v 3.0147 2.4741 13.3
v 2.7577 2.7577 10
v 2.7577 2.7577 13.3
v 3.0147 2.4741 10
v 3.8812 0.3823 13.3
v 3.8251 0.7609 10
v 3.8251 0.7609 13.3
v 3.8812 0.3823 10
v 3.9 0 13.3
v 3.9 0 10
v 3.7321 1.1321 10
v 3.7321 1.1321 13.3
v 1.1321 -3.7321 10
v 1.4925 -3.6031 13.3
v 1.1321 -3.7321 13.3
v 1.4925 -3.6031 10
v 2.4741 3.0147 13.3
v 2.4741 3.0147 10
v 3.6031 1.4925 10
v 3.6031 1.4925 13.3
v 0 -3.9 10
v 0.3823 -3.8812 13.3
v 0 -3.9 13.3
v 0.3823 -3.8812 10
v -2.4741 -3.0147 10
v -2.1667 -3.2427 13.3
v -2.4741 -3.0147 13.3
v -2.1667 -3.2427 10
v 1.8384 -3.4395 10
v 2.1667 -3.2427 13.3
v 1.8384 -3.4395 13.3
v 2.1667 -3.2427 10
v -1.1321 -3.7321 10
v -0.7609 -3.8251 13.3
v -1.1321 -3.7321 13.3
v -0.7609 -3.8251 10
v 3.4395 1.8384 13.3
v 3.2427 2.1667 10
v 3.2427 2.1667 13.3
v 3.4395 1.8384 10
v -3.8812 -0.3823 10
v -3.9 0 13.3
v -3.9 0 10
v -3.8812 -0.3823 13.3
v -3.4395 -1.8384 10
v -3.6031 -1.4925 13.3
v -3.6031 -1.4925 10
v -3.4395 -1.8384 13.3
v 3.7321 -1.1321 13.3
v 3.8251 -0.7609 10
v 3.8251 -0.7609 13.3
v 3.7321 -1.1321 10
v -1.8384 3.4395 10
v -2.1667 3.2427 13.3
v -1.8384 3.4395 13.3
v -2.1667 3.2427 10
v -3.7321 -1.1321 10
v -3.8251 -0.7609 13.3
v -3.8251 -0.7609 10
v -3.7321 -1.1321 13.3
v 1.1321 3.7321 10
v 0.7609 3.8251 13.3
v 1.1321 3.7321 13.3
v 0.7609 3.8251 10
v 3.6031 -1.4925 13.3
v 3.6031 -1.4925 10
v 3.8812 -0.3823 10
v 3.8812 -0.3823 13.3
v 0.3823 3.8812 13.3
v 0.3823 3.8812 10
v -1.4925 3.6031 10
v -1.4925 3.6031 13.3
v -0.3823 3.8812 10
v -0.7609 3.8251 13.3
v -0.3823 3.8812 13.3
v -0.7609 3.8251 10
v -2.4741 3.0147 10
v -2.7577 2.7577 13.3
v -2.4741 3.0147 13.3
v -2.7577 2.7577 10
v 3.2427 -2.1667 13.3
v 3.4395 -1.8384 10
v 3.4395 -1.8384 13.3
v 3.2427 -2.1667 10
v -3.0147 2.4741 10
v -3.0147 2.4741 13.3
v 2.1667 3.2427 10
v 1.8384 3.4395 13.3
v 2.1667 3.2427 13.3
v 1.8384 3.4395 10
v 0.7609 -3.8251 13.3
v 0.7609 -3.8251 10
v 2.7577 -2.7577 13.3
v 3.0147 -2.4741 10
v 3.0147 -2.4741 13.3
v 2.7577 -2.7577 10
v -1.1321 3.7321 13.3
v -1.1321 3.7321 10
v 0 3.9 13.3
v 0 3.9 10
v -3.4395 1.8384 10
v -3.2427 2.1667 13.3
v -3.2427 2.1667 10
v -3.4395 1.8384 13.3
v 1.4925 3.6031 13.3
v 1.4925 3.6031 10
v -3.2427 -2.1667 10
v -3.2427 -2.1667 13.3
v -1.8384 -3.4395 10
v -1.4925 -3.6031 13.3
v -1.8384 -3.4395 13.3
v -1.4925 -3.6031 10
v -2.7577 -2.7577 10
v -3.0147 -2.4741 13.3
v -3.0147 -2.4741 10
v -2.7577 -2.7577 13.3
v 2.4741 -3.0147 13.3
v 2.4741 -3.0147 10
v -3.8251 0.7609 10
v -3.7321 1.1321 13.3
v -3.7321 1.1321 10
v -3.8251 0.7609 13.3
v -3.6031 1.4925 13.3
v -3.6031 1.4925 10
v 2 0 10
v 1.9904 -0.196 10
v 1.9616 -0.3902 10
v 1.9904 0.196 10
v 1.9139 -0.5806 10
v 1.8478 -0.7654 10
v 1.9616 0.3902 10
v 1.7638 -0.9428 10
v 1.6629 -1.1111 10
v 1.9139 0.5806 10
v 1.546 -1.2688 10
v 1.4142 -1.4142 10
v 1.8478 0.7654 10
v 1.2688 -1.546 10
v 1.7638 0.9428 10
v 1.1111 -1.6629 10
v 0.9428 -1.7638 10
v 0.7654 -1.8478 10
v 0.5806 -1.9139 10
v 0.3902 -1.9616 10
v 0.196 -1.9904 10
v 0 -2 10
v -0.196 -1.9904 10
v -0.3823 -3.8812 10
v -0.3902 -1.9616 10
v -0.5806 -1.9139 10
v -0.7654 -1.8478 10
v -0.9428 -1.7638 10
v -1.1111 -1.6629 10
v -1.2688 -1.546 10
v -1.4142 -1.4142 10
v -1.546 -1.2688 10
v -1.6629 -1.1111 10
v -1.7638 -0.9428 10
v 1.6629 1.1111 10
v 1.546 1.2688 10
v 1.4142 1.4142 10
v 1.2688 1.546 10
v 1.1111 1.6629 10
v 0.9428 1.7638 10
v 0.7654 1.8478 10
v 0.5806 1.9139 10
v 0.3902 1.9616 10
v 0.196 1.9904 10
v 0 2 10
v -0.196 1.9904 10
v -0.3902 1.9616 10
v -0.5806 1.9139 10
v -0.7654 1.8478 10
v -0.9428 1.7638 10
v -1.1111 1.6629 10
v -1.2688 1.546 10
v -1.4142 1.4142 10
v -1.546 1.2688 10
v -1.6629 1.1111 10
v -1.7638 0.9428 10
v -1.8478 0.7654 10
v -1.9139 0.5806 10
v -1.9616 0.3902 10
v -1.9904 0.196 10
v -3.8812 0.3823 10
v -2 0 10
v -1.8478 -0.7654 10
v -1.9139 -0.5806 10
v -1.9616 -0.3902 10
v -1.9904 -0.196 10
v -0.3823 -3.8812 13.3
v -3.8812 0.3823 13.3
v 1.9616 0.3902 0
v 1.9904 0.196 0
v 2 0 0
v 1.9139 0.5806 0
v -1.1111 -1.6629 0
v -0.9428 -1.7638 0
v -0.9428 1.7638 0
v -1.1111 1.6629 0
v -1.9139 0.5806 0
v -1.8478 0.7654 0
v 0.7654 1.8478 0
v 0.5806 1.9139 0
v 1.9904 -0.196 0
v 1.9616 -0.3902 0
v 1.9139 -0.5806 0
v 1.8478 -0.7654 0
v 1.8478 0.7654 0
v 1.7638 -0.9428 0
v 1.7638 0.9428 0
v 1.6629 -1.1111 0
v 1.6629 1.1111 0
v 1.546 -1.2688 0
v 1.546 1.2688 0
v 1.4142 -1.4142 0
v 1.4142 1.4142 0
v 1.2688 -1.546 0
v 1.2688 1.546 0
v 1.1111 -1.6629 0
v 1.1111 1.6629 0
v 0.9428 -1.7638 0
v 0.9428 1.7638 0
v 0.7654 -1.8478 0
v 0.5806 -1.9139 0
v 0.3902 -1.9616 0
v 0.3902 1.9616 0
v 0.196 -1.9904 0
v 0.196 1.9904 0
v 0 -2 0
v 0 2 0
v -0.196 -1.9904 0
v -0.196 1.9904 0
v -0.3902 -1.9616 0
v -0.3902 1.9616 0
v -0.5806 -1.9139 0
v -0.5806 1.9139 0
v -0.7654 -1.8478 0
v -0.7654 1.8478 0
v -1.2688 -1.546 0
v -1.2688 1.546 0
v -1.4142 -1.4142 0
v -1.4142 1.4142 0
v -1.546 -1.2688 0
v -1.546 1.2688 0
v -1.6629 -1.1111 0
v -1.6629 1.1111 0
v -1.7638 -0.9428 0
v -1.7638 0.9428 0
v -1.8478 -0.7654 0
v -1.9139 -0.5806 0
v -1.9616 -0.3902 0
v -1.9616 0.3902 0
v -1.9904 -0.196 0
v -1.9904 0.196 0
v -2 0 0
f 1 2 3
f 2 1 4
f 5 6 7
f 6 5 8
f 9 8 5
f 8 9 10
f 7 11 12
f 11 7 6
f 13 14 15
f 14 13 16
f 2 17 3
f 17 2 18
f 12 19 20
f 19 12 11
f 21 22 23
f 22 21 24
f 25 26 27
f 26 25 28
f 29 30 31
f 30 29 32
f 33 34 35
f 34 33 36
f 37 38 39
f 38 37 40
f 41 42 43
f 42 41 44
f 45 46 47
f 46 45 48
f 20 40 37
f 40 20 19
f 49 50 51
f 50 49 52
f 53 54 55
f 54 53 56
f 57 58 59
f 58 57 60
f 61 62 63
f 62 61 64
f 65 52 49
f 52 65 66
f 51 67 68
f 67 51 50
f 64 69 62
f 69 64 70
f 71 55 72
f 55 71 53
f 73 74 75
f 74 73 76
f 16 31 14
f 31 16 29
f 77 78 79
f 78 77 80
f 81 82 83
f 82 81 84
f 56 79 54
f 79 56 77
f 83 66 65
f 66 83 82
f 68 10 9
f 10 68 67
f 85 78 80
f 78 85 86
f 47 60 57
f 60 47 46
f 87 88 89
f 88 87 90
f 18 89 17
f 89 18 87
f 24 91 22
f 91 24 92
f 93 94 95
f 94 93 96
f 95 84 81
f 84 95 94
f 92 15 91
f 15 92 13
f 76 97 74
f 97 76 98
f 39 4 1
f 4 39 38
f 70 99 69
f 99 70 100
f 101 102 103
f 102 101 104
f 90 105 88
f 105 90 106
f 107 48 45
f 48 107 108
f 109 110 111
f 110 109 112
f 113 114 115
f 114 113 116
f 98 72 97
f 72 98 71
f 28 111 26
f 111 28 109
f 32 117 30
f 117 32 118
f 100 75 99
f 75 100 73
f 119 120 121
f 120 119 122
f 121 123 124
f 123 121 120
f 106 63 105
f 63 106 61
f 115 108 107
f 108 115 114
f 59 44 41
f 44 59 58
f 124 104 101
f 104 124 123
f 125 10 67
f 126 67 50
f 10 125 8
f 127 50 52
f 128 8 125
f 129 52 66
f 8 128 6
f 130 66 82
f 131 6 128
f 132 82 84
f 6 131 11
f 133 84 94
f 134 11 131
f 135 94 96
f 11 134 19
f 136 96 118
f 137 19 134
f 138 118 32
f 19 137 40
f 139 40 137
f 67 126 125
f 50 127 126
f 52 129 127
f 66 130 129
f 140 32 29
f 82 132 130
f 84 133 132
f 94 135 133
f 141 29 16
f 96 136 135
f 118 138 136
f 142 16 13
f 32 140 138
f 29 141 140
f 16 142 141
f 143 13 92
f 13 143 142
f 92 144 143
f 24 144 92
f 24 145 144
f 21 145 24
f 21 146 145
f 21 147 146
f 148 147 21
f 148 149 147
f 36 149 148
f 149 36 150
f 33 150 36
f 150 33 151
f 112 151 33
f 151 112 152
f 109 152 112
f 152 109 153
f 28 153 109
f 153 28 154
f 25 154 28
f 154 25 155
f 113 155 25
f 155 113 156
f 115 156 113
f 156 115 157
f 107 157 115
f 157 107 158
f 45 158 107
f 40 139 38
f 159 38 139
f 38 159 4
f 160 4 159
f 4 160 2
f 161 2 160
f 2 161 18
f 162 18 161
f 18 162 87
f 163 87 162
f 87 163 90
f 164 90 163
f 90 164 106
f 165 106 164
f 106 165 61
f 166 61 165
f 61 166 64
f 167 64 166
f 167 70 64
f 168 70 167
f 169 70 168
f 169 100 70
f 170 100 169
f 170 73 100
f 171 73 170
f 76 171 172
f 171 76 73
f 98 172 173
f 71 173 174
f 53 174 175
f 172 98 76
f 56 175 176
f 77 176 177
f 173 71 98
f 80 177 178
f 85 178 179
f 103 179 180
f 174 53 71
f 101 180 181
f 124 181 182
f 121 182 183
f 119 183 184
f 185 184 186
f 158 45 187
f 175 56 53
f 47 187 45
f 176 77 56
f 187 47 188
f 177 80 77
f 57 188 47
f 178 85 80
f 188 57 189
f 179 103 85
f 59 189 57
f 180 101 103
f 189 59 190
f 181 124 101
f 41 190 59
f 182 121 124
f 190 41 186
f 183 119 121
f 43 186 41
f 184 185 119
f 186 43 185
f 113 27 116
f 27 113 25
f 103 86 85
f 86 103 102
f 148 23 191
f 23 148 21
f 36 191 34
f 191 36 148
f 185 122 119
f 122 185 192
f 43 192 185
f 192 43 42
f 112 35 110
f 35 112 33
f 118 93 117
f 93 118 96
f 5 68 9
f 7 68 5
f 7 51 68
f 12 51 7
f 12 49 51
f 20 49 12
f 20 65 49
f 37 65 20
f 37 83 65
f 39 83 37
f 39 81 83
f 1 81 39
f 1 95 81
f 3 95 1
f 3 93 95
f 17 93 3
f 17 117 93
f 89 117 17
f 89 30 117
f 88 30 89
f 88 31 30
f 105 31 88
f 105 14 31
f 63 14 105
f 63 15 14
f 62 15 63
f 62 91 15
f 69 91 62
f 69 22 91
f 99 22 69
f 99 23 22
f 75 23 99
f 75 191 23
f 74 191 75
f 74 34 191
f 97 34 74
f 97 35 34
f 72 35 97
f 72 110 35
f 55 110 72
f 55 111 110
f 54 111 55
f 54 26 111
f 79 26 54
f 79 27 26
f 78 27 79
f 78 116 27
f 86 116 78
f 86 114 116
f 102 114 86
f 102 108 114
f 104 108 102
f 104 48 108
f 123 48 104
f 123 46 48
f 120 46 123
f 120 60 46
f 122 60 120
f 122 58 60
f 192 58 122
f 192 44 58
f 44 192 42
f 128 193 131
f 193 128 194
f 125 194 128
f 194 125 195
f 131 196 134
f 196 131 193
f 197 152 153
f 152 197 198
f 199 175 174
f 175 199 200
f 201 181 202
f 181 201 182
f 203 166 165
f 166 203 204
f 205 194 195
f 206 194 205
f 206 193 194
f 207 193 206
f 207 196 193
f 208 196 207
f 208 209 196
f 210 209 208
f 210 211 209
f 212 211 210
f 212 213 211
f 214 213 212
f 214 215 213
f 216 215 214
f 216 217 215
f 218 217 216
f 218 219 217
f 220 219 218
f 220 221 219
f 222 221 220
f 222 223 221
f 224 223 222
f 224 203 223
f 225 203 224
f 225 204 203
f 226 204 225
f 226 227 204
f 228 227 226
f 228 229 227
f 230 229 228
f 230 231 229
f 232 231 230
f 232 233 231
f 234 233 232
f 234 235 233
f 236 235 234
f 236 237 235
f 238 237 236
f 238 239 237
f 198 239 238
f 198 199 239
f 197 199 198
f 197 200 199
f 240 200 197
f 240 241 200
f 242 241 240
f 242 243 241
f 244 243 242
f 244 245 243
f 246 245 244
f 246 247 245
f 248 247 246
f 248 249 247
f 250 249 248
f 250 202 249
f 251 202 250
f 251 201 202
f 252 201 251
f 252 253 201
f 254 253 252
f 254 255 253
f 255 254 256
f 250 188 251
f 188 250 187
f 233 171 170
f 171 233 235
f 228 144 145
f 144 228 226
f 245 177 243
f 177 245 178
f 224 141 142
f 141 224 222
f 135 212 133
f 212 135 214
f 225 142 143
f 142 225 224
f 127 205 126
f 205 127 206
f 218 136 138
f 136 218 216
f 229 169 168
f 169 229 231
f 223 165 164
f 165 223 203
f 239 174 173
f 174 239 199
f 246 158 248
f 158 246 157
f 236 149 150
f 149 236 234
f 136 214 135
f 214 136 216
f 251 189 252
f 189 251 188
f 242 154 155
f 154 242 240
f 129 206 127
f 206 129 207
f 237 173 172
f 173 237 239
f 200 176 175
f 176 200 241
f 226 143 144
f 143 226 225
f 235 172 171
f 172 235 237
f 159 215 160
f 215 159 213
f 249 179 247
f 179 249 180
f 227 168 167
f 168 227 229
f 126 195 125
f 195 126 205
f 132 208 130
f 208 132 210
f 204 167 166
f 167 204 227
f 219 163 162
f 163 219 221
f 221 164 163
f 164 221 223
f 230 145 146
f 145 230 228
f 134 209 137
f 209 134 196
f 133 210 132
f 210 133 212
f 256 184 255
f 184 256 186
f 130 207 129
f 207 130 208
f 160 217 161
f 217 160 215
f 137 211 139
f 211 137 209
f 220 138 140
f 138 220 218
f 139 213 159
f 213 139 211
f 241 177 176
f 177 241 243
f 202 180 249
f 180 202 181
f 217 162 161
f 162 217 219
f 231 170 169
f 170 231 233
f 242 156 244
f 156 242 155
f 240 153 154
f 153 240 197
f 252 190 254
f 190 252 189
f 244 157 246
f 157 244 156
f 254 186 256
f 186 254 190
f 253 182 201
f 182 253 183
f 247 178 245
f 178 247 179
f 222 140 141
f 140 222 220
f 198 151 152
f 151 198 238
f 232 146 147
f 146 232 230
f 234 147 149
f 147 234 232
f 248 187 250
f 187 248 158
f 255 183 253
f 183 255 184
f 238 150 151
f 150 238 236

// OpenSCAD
module pan_head_screw() {
    union() {
        // Screw head
        translate([0, 0, 10])
            cylinder(h = 3.3, d = 7.8, $fn = 64);
        
        // Screw shaft
        cylinder(h = 10, d = 4.0, $fn = 64);
    }
}

pan_head_screw();
